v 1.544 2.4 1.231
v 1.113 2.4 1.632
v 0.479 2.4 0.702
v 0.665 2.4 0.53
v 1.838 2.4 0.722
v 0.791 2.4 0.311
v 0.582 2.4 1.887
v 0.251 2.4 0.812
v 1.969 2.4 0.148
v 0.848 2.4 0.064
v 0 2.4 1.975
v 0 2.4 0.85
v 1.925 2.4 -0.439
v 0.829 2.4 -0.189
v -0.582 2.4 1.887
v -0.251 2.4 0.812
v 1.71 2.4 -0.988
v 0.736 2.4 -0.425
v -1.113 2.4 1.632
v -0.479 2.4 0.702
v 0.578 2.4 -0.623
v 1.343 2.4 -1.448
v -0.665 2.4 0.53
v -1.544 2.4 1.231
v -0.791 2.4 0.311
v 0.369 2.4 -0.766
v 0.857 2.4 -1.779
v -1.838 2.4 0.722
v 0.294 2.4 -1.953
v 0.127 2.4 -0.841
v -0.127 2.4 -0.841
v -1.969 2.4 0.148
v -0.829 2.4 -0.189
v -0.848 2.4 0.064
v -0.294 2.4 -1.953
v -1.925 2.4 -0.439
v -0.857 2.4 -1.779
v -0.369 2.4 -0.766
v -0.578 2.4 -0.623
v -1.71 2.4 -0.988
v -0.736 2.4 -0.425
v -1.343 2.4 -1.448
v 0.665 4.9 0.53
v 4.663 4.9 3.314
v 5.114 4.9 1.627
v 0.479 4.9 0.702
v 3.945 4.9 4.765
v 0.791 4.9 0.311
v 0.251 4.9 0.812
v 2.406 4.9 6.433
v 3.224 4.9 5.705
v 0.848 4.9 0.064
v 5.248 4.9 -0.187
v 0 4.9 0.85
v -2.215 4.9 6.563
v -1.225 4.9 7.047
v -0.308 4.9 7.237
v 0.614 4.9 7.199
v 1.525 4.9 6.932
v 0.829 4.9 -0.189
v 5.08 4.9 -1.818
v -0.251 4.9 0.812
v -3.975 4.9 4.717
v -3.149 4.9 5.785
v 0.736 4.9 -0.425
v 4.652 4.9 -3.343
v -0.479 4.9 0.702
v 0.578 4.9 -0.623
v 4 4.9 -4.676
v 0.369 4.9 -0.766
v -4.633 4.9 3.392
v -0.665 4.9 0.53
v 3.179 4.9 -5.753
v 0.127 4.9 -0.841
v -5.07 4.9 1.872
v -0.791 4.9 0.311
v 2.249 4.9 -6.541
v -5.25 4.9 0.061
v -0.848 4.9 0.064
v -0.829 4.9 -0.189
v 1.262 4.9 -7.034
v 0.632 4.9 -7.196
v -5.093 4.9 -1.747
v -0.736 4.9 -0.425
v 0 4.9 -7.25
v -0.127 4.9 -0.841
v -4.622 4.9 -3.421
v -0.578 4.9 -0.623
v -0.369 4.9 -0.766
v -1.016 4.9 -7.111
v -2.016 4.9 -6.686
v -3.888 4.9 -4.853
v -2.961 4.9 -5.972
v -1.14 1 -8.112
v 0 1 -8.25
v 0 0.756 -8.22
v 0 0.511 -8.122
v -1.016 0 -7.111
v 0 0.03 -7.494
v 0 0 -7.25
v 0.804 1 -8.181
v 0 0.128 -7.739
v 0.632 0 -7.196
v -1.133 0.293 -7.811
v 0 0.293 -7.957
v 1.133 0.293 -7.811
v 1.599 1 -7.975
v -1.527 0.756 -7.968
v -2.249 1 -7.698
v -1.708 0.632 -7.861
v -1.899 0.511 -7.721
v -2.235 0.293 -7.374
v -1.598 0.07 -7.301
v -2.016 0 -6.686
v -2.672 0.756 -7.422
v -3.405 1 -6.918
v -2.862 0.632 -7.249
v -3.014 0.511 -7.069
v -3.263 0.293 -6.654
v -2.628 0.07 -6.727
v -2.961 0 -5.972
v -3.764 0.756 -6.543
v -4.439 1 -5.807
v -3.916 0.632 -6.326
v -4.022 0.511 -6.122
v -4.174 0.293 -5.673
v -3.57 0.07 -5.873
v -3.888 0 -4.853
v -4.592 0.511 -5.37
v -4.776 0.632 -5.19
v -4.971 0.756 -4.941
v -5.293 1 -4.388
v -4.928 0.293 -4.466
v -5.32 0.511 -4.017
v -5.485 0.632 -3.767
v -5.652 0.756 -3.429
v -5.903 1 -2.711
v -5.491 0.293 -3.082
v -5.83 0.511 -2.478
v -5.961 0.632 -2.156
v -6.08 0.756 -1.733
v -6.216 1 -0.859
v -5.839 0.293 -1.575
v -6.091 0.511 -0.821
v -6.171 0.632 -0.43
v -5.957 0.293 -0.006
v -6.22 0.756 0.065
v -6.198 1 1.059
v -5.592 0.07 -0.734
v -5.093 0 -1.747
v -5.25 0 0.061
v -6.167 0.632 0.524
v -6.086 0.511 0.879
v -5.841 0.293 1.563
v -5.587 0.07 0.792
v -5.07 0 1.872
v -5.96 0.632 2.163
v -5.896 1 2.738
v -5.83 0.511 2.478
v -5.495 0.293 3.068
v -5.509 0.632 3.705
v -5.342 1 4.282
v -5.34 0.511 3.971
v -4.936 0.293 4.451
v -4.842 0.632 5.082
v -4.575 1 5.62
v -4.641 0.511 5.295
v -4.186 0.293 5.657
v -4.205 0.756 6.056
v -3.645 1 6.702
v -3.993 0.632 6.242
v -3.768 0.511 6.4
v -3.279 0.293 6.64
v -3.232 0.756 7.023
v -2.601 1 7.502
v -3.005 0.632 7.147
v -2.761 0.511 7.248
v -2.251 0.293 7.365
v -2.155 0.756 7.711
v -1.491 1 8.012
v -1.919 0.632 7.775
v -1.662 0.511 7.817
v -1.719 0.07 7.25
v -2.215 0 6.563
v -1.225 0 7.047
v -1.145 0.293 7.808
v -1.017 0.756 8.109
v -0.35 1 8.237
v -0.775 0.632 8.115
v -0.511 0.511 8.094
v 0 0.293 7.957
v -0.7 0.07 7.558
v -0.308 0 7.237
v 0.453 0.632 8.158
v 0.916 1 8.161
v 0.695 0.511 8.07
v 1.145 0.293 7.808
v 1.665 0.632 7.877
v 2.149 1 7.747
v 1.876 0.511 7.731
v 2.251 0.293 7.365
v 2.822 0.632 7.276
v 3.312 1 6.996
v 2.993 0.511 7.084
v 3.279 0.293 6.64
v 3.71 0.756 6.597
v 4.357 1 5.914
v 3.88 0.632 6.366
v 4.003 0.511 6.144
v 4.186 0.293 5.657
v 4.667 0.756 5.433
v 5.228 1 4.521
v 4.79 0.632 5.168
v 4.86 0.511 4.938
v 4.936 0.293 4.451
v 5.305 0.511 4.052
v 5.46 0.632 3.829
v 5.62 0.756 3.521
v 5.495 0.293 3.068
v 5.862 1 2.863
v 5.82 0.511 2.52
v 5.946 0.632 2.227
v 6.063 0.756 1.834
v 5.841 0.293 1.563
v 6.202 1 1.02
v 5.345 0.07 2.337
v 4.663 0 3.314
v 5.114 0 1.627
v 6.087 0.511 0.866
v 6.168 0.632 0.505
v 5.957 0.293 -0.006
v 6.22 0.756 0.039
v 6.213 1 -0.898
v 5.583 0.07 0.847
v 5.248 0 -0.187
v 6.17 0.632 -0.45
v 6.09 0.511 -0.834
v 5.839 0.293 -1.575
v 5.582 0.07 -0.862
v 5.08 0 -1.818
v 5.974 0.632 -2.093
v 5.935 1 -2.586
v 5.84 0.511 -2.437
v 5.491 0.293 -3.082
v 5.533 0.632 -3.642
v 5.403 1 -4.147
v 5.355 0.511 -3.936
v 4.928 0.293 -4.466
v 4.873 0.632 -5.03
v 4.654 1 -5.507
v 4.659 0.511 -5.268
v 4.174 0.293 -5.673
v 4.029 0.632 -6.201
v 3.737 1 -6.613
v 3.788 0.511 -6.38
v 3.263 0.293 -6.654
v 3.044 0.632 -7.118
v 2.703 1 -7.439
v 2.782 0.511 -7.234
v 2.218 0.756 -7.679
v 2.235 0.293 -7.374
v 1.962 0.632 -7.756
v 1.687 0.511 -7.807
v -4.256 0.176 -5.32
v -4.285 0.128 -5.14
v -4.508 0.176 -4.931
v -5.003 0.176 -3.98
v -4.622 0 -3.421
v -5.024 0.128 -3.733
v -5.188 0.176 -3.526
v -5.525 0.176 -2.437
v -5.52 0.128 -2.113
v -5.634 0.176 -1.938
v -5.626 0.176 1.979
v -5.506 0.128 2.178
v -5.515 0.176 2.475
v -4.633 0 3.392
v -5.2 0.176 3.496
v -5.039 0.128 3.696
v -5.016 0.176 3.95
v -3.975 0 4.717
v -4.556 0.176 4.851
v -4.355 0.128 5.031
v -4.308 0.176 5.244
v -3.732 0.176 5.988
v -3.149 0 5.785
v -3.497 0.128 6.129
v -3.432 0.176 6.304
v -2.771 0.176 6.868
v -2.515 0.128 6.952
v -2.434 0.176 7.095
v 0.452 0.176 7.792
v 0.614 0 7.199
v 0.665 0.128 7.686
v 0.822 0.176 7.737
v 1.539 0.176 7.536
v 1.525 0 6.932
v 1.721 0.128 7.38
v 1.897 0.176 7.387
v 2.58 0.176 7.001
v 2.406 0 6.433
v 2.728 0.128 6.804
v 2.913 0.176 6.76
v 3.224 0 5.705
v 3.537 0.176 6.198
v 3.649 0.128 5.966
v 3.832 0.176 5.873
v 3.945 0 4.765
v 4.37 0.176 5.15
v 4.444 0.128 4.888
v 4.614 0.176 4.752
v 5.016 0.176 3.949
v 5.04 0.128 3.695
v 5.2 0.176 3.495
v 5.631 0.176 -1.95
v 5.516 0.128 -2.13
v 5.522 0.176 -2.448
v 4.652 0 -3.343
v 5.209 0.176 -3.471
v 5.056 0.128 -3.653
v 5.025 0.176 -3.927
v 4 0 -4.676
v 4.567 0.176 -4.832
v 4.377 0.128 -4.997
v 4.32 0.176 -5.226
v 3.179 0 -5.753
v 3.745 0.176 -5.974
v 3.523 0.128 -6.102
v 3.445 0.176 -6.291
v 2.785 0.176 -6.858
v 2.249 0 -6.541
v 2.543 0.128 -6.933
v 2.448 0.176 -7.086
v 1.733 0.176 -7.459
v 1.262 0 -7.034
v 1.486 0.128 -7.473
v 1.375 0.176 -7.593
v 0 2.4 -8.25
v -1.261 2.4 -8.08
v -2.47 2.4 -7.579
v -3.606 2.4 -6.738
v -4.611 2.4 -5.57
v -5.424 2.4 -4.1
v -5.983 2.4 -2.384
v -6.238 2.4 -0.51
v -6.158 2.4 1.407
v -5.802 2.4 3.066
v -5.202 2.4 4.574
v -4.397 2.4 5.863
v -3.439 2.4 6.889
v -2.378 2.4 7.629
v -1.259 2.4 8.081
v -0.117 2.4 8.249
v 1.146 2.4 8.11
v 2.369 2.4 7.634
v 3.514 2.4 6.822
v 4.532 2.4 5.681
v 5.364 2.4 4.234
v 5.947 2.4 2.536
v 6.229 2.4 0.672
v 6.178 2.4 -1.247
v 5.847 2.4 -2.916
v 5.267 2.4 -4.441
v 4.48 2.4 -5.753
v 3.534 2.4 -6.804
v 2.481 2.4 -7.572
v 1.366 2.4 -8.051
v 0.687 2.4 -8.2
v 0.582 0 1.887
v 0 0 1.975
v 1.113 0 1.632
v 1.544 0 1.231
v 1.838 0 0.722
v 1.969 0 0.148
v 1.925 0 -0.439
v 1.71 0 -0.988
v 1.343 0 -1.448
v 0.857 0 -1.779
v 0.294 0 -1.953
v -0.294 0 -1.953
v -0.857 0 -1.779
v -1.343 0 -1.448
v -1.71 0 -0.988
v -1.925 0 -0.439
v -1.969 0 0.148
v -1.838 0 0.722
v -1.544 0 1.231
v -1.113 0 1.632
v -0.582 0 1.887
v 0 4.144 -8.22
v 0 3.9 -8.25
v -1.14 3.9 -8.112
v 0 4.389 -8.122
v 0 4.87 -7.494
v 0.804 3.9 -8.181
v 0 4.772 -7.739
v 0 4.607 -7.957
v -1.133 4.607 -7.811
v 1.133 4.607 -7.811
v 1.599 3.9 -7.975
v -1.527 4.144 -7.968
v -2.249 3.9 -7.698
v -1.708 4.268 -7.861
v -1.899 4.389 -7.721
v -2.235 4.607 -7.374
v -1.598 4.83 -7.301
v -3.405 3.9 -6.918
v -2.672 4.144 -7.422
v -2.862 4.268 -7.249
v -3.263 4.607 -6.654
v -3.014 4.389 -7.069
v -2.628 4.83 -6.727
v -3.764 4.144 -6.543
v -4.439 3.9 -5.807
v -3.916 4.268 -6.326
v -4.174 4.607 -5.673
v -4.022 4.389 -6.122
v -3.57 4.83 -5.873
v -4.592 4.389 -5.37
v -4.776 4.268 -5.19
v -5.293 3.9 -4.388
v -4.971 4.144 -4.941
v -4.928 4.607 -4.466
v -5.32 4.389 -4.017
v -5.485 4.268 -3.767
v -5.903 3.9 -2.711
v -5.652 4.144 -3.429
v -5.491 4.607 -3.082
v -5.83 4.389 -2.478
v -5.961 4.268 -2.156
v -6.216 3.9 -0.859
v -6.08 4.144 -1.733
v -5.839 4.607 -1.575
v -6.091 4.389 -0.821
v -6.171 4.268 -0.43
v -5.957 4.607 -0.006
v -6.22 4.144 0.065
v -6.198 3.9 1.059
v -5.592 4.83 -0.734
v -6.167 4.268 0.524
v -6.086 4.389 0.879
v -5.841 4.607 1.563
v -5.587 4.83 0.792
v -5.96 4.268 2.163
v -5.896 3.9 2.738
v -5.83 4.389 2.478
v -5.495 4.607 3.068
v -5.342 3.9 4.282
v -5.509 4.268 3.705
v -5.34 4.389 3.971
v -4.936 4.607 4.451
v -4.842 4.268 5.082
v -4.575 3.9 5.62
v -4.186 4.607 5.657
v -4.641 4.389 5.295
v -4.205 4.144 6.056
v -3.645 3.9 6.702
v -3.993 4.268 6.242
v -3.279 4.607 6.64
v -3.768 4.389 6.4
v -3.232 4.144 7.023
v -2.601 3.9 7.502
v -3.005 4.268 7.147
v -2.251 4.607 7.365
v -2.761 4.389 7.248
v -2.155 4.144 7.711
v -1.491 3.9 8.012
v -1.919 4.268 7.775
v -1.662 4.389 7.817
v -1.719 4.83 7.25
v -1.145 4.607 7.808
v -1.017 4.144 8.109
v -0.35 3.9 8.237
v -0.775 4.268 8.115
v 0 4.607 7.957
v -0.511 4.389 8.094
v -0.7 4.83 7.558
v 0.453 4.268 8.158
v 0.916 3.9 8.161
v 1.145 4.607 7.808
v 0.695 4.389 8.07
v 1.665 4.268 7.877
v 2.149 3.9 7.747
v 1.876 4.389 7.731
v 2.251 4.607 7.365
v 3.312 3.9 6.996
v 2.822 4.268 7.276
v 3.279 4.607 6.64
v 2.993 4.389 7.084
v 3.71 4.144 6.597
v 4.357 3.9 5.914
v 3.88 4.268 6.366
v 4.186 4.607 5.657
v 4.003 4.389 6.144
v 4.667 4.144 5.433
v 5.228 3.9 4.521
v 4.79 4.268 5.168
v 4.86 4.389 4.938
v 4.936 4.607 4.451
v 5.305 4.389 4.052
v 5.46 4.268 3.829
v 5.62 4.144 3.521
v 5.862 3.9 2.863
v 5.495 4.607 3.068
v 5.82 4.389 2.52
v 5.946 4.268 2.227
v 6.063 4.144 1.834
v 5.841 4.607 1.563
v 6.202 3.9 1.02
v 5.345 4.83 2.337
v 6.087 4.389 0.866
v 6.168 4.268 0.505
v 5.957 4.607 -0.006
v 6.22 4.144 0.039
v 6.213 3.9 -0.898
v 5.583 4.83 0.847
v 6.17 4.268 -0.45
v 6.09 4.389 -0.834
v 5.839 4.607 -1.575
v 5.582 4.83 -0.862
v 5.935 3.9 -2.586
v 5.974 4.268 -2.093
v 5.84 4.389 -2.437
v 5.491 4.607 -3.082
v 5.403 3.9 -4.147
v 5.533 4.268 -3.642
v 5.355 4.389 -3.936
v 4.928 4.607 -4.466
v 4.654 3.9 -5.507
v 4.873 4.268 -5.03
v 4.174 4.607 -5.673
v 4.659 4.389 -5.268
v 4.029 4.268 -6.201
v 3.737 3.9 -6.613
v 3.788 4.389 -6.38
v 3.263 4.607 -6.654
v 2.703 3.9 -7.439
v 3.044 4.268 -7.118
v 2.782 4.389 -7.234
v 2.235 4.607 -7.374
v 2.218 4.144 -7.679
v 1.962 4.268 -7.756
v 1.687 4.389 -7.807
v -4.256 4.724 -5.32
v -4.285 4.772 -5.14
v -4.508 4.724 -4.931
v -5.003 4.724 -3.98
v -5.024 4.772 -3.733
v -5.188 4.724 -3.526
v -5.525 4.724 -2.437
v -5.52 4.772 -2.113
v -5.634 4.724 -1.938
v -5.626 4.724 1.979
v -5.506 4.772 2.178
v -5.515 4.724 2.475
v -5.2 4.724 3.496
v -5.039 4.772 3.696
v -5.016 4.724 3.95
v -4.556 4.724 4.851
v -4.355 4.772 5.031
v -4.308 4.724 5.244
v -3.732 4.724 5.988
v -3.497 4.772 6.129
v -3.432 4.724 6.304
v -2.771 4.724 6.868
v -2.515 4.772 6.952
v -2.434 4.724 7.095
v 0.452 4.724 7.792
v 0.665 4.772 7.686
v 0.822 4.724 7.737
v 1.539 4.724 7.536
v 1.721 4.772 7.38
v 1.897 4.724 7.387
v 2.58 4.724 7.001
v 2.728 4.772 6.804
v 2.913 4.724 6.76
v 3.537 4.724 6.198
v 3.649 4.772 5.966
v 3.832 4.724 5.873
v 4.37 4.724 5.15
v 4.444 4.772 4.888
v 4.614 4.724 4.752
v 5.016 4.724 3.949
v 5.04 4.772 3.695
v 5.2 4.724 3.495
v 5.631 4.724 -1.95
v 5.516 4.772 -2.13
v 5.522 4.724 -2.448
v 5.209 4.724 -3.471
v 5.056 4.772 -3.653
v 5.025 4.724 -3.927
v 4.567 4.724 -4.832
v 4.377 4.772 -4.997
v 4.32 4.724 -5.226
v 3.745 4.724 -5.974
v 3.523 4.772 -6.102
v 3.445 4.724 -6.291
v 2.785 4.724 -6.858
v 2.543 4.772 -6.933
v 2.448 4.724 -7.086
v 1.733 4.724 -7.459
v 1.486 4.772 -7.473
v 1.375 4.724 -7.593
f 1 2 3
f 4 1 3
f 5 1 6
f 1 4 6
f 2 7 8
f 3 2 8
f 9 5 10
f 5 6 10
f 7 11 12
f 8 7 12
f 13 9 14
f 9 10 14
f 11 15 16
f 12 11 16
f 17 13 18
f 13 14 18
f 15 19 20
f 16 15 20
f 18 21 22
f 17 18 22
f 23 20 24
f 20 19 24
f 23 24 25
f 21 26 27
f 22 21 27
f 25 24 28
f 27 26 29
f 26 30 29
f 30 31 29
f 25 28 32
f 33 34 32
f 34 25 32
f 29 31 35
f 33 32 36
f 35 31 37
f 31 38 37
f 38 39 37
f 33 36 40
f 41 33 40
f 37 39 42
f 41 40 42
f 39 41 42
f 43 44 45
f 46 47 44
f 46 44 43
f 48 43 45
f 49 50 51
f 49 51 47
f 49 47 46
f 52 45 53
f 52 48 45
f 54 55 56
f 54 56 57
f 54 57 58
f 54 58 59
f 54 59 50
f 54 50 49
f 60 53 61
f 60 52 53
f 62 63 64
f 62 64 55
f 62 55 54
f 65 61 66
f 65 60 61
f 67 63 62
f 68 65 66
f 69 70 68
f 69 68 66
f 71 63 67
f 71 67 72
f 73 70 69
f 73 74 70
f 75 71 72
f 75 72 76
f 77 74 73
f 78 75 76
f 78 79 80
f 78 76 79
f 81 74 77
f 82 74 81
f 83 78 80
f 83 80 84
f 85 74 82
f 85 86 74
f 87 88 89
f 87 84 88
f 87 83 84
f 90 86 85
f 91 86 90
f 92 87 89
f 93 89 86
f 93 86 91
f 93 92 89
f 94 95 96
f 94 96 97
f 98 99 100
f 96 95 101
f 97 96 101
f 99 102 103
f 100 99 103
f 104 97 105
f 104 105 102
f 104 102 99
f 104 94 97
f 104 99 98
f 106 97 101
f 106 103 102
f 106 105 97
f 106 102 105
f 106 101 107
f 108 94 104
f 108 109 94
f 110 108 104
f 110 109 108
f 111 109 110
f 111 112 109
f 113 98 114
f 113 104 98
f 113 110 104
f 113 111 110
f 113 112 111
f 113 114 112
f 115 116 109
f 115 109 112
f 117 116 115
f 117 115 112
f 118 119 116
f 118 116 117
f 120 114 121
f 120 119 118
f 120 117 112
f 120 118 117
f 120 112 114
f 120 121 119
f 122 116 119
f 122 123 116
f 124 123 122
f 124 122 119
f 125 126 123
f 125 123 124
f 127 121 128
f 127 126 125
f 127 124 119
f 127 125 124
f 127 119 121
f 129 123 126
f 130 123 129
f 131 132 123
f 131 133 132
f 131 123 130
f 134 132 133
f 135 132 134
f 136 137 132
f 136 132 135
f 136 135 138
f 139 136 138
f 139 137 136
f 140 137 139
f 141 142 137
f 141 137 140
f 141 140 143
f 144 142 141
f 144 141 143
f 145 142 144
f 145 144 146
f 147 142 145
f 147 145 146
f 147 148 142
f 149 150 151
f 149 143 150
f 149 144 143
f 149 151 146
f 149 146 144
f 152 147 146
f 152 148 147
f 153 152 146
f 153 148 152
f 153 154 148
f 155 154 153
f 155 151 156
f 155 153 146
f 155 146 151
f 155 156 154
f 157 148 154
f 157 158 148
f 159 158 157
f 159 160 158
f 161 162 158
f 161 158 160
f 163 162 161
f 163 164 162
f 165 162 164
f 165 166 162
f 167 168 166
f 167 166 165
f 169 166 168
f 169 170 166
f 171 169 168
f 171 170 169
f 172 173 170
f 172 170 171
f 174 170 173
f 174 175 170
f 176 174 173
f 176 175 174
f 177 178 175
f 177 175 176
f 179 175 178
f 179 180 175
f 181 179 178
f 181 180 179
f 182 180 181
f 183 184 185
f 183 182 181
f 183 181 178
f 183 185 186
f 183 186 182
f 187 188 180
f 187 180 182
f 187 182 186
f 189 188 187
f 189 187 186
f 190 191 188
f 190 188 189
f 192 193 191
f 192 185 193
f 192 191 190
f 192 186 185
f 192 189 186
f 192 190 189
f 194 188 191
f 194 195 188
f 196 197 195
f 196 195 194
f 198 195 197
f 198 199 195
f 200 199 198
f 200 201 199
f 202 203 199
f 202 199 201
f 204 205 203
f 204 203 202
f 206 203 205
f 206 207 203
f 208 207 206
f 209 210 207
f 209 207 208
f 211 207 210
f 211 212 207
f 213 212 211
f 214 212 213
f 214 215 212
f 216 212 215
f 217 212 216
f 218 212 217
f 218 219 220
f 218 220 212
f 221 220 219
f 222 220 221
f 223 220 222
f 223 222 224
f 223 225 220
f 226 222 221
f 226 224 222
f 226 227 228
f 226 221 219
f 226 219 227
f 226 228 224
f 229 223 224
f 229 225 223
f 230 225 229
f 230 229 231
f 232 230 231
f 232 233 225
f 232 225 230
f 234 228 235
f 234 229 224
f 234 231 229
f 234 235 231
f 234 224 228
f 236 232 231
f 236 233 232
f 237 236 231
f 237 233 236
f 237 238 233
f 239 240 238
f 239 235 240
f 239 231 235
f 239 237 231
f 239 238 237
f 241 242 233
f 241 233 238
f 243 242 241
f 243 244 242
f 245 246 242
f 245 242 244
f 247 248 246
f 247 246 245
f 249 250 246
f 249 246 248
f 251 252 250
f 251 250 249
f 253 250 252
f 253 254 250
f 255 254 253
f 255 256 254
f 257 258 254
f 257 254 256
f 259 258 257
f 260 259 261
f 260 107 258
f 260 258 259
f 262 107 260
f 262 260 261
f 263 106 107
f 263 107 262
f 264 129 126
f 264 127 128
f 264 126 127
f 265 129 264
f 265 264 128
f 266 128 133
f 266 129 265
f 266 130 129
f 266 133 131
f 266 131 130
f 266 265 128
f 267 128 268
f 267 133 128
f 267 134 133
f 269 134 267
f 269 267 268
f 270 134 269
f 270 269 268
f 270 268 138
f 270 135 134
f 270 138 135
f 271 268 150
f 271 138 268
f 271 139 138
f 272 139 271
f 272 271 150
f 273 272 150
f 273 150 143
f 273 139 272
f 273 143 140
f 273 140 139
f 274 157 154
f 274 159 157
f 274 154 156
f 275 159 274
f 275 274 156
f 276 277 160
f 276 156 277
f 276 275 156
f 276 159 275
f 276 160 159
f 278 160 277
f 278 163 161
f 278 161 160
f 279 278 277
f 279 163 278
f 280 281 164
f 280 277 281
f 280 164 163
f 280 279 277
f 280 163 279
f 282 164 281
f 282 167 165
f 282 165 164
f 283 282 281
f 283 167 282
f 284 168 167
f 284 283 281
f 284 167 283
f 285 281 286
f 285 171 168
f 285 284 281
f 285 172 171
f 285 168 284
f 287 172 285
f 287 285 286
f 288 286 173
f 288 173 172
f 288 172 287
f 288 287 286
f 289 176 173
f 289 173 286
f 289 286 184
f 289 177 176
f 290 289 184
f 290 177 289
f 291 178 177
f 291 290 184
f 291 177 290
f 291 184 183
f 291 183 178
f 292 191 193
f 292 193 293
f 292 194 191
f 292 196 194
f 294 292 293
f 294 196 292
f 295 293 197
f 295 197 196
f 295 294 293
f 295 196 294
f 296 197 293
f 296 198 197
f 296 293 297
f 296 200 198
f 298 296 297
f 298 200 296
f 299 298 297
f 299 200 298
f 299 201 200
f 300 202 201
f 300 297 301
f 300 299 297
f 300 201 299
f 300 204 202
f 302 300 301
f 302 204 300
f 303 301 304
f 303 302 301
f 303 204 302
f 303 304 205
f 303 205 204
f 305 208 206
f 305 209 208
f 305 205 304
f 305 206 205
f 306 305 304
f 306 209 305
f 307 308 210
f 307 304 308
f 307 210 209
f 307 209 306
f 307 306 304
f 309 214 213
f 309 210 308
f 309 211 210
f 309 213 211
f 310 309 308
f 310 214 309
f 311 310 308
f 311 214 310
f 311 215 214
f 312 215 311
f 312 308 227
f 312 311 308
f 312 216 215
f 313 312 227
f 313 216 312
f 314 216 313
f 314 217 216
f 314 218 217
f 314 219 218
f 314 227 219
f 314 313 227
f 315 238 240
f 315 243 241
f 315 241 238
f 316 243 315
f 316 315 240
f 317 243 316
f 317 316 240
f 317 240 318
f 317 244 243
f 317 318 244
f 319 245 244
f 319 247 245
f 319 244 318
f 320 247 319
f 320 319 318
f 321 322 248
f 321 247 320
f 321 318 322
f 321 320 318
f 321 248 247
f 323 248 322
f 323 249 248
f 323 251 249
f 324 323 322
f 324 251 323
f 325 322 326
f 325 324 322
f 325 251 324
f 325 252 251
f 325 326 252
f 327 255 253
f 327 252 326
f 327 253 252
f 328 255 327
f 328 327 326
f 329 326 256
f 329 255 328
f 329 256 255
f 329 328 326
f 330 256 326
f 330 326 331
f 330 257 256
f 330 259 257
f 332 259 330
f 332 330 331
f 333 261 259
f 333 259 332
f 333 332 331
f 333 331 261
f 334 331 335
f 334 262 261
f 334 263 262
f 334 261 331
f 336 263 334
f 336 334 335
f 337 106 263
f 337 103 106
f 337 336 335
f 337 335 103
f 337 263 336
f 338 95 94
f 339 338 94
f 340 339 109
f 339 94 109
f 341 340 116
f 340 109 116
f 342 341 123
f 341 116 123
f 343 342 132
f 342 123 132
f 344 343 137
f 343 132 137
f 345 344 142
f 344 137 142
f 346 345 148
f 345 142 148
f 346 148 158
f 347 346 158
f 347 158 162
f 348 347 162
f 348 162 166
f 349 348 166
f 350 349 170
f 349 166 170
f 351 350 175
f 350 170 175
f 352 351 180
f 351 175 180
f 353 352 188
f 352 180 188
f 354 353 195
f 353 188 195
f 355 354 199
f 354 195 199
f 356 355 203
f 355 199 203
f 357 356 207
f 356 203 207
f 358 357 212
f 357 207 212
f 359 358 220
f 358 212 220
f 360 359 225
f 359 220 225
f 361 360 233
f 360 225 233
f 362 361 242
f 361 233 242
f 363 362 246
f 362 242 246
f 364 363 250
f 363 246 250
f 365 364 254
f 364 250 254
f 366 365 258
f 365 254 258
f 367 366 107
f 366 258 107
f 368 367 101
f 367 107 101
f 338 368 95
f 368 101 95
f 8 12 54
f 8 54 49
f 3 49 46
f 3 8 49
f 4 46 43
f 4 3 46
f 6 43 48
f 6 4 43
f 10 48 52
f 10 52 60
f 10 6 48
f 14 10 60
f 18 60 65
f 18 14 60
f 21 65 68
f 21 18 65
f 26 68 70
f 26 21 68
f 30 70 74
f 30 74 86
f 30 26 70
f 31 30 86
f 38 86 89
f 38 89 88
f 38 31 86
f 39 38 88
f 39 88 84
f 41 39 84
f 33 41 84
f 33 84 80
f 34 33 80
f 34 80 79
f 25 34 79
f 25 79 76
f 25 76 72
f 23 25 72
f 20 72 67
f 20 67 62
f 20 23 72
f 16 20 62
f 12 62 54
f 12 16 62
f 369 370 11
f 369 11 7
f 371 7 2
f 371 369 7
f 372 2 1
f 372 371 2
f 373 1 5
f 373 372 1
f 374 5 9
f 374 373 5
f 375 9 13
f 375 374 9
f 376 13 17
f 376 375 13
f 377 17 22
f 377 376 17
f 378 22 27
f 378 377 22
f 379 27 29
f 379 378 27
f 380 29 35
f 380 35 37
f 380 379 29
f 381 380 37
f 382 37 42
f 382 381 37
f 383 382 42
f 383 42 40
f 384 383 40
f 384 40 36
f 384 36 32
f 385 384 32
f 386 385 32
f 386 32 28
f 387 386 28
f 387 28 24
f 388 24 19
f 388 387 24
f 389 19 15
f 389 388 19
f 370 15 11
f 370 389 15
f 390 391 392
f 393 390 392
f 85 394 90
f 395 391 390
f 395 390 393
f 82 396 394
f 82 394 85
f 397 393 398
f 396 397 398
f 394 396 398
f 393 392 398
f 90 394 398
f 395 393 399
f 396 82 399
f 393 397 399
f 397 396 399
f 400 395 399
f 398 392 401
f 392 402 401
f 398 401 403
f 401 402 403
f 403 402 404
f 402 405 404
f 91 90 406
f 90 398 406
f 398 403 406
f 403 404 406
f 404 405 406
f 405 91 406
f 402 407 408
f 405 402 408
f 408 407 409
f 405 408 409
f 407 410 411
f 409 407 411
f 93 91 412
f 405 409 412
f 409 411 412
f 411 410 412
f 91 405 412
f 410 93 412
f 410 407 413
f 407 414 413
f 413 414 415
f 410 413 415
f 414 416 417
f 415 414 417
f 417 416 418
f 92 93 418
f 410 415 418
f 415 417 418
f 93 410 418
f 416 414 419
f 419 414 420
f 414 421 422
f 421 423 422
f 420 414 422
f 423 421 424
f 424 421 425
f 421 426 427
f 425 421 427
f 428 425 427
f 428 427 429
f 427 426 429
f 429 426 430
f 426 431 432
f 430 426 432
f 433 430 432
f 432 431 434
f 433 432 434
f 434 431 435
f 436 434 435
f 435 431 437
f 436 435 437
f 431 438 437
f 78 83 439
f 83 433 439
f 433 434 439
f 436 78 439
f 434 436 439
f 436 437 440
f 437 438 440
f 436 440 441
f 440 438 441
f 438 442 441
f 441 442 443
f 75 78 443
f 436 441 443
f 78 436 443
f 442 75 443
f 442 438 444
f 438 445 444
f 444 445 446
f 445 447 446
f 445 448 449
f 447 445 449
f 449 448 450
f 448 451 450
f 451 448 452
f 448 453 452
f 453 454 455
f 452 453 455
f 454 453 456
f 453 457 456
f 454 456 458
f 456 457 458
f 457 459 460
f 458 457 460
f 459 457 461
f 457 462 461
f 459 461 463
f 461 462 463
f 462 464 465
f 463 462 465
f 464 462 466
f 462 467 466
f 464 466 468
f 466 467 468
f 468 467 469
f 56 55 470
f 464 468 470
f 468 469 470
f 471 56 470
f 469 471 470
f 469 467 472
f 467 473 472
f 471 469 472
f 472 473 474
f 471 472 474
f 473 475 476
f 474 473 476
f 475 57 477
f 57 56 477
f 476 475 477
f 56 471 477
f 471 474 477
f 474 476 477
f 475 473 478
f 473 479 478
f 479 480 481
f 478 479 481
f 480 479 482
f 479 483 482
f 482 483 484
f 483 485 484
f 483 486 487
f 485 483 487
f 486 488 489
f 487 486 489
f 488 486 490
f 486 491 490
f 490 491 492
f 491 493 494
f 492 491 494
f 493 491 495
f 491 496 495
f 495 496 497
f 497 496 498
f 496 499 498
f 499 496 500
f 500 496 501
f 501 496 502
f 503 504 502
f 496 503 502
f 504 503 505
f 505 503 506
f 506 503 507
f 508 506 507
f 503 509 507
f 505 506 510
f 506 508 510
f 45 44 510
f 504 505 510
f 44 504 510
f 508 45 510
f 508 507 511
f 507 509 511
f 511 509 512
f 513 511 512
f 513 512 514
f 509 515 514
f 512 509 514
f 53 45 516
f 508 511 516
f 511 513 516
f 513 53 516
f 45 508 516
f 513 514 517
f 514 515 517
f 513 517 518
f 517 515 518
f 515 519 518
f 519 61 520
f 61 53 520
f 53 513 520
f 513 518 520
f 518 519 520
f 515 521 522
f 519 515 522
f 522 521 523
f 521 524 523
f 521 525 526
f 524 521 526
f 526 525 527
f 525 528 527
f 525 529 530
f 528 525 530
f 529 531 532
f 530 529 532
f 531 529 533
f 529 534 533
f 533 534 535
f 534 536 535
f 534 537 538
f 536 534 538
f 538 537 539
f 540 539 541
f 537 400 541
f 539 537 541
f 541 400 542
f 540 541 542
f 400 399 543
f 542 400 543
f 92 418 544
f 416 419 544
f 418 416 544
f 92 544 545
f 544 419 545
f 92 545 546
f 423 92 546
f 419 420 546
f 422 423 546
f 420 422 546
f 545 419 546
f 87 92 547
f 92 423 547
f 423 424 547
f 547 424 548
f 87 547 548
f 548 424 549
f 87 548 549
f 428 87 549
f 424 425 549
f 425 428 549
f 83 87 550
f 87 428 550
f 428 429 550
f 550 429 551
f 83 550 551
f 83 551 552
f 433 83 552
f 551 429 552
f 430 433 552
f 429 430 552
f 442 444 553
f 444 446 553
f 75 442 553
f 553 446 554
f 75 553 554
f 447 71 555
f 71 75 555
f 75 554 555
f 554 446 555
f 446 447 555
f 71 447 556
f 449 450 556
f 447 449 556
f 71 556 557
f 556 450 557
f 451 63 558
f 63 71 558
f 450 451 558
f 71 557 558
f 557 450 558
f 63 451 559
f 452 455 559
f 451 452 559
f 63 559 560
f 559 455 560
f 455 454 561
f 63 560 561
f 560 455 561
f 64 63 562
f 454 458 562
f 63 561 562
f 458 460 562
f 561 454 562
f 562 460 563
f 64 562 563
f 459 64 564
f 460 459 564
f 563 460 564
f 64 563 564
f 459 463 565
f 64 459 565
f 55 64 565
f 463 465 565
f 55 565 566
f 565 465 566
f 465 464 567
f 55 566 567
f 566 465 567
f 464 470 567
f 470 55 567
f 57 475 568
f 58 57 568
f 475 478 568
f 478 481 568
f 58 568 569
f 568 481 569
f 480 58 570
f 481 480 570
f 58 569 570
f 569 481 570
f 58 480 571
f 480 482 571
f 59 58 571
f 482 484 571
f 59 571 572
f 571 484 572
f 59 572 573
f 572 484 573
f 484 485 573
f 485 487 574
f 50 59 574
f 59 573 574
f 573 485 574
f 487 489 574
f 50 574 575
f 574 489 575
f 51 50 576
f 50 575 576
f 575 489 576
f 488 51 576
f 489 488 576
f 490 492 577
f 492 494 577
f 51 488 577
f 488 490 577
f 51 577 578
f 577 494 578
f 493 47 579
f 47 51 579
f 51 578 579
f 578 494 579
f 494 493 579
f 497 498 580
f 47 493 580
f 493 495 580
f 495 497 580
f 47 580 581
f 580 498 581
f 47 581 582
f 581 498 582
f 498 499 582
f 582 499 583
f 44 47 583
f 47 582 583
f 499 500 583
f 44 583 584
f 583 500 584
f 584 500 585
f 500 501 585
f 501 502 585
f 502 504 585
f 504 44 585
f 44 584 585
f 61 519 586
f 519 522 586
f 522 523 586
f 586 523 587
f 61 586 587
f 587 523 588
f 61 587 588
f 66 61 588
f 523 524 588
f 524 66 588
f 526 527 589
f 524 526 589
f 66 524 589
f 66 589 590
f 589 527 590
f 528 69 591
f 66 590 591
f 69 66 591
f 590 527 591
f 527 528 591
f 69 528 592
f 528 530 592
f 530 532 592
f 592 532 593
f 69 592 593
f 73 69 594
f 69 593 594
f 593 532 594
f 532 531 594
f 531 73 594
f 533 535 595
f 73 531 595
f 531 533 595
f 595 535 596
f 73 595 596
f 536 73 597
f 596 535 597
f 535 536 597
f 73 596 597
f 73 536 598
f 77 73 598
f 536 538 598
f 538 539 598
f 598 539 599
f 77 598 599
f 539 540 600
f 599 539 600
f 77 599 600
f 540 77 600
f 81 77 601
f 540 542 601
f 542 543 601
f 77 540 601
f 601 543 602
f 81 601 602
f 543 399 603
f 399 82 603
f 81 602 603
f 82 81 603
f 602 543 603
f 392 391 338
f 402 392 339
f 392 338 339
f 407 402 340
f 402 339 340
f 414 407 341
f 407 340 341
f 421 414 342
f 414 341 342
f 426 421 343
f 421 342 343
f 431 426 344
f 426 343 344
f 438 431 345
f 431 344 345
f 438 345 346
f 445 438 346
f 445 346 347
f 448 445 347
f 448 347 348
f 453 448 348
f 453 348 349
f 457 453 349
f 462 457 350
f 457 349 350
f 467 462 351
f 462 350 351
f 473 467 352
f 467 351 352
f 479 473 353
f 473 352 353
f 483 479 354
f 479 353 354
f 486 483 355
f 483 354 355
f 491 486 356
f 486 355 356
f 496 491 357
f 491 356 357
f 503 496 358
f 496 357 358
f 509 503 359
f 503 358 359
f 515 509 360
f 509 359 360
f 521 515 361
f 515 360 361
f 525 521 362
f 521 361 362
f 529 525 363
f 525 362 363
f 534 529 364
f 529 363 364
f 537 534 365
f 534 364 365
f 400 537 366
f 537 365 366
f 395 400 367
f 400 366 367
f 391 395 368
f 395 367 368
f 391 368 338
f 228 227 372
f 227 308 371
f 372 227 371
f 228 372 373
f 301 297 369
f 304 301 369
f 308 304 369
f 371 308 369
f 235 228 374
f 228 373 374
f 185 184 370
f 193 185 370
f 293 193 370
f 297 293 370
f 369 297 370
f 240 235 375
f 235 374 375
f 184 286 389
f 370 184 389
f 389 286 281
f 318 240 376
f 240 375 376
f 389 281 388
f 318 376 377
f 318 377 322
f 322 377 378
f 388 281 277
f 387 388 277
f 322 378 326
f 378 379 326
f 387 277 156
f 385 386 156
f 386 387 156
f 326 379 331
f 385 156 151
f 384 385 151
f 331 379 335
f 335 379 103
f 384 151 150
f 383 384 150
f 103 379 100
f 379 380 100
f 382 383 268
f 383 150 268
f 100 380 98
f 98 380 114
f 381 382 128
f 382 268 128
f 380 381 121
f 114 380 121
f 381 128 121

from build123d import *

# Parameters (mm, degrees)
SKETCH1_RX          = 8.25
SKETCH1_RY          = 6.25
SKETCH1_R           = 1.975
BOSS_EXTRUDE1_DEPTH = 2.4
SKETCH2_RX          = 8.25
SKETCH2_RY          = 6.25
SKETCH2_R           = 0.85
BOSS_EXTRUDE2_DEPTH = 2.5
FILLET1_R           = 1


with BuildPart() as part:
    # Sketch1 → Boss-Extrude1 (new body)
    with BuildSketch(Plane(origin=(0, 0, 0), x_dir=(1, 0, 0), z_dir=(0, 1, 0))):
        with Locations(Location((0, 0), (0, 0, 90))):
            Ellipse(SKETCH1_RX, SKETCH1_RY)
        with Locations(Location((0, 0, 0), (0, 0, 270))):
            Circle(SKETCH1_R, mode=Mode.SUBTRACT)
    extrude(amount=BOSS_EXTRUDE1_DEPTH)

    # Sketch2 → Boss-Extrude2 (add)
    with BuildSketch(Plane(origin=(0, 2.4, 0), x_dir=(1, 0, 0), z_dir=(0, 1, 0))):
        with Locations(Location((0, 0), (0, 0, 90))):
            Ellipse(SKETCH2_RX, SKETCH2_RY)
        with Locations(Location((0, 0, 0), (0, 0, 270))):
            Circle(SKETCH2_R, mode=Mode.SUBTRACT)
    extrude(amount=BOSS_EXTRUDE2_DEPTH)

    # Fillet1
    fillet1_edges = [part.edges().sort_by_distance(p)[0] for p in [
        (0.001952715, 4.9, 8.249999597),
        (0.001952715, 0, 8.249999597),
    ]]
    fillet(fillet1_edges, radius=FILLET1_R)


solid = part.part
